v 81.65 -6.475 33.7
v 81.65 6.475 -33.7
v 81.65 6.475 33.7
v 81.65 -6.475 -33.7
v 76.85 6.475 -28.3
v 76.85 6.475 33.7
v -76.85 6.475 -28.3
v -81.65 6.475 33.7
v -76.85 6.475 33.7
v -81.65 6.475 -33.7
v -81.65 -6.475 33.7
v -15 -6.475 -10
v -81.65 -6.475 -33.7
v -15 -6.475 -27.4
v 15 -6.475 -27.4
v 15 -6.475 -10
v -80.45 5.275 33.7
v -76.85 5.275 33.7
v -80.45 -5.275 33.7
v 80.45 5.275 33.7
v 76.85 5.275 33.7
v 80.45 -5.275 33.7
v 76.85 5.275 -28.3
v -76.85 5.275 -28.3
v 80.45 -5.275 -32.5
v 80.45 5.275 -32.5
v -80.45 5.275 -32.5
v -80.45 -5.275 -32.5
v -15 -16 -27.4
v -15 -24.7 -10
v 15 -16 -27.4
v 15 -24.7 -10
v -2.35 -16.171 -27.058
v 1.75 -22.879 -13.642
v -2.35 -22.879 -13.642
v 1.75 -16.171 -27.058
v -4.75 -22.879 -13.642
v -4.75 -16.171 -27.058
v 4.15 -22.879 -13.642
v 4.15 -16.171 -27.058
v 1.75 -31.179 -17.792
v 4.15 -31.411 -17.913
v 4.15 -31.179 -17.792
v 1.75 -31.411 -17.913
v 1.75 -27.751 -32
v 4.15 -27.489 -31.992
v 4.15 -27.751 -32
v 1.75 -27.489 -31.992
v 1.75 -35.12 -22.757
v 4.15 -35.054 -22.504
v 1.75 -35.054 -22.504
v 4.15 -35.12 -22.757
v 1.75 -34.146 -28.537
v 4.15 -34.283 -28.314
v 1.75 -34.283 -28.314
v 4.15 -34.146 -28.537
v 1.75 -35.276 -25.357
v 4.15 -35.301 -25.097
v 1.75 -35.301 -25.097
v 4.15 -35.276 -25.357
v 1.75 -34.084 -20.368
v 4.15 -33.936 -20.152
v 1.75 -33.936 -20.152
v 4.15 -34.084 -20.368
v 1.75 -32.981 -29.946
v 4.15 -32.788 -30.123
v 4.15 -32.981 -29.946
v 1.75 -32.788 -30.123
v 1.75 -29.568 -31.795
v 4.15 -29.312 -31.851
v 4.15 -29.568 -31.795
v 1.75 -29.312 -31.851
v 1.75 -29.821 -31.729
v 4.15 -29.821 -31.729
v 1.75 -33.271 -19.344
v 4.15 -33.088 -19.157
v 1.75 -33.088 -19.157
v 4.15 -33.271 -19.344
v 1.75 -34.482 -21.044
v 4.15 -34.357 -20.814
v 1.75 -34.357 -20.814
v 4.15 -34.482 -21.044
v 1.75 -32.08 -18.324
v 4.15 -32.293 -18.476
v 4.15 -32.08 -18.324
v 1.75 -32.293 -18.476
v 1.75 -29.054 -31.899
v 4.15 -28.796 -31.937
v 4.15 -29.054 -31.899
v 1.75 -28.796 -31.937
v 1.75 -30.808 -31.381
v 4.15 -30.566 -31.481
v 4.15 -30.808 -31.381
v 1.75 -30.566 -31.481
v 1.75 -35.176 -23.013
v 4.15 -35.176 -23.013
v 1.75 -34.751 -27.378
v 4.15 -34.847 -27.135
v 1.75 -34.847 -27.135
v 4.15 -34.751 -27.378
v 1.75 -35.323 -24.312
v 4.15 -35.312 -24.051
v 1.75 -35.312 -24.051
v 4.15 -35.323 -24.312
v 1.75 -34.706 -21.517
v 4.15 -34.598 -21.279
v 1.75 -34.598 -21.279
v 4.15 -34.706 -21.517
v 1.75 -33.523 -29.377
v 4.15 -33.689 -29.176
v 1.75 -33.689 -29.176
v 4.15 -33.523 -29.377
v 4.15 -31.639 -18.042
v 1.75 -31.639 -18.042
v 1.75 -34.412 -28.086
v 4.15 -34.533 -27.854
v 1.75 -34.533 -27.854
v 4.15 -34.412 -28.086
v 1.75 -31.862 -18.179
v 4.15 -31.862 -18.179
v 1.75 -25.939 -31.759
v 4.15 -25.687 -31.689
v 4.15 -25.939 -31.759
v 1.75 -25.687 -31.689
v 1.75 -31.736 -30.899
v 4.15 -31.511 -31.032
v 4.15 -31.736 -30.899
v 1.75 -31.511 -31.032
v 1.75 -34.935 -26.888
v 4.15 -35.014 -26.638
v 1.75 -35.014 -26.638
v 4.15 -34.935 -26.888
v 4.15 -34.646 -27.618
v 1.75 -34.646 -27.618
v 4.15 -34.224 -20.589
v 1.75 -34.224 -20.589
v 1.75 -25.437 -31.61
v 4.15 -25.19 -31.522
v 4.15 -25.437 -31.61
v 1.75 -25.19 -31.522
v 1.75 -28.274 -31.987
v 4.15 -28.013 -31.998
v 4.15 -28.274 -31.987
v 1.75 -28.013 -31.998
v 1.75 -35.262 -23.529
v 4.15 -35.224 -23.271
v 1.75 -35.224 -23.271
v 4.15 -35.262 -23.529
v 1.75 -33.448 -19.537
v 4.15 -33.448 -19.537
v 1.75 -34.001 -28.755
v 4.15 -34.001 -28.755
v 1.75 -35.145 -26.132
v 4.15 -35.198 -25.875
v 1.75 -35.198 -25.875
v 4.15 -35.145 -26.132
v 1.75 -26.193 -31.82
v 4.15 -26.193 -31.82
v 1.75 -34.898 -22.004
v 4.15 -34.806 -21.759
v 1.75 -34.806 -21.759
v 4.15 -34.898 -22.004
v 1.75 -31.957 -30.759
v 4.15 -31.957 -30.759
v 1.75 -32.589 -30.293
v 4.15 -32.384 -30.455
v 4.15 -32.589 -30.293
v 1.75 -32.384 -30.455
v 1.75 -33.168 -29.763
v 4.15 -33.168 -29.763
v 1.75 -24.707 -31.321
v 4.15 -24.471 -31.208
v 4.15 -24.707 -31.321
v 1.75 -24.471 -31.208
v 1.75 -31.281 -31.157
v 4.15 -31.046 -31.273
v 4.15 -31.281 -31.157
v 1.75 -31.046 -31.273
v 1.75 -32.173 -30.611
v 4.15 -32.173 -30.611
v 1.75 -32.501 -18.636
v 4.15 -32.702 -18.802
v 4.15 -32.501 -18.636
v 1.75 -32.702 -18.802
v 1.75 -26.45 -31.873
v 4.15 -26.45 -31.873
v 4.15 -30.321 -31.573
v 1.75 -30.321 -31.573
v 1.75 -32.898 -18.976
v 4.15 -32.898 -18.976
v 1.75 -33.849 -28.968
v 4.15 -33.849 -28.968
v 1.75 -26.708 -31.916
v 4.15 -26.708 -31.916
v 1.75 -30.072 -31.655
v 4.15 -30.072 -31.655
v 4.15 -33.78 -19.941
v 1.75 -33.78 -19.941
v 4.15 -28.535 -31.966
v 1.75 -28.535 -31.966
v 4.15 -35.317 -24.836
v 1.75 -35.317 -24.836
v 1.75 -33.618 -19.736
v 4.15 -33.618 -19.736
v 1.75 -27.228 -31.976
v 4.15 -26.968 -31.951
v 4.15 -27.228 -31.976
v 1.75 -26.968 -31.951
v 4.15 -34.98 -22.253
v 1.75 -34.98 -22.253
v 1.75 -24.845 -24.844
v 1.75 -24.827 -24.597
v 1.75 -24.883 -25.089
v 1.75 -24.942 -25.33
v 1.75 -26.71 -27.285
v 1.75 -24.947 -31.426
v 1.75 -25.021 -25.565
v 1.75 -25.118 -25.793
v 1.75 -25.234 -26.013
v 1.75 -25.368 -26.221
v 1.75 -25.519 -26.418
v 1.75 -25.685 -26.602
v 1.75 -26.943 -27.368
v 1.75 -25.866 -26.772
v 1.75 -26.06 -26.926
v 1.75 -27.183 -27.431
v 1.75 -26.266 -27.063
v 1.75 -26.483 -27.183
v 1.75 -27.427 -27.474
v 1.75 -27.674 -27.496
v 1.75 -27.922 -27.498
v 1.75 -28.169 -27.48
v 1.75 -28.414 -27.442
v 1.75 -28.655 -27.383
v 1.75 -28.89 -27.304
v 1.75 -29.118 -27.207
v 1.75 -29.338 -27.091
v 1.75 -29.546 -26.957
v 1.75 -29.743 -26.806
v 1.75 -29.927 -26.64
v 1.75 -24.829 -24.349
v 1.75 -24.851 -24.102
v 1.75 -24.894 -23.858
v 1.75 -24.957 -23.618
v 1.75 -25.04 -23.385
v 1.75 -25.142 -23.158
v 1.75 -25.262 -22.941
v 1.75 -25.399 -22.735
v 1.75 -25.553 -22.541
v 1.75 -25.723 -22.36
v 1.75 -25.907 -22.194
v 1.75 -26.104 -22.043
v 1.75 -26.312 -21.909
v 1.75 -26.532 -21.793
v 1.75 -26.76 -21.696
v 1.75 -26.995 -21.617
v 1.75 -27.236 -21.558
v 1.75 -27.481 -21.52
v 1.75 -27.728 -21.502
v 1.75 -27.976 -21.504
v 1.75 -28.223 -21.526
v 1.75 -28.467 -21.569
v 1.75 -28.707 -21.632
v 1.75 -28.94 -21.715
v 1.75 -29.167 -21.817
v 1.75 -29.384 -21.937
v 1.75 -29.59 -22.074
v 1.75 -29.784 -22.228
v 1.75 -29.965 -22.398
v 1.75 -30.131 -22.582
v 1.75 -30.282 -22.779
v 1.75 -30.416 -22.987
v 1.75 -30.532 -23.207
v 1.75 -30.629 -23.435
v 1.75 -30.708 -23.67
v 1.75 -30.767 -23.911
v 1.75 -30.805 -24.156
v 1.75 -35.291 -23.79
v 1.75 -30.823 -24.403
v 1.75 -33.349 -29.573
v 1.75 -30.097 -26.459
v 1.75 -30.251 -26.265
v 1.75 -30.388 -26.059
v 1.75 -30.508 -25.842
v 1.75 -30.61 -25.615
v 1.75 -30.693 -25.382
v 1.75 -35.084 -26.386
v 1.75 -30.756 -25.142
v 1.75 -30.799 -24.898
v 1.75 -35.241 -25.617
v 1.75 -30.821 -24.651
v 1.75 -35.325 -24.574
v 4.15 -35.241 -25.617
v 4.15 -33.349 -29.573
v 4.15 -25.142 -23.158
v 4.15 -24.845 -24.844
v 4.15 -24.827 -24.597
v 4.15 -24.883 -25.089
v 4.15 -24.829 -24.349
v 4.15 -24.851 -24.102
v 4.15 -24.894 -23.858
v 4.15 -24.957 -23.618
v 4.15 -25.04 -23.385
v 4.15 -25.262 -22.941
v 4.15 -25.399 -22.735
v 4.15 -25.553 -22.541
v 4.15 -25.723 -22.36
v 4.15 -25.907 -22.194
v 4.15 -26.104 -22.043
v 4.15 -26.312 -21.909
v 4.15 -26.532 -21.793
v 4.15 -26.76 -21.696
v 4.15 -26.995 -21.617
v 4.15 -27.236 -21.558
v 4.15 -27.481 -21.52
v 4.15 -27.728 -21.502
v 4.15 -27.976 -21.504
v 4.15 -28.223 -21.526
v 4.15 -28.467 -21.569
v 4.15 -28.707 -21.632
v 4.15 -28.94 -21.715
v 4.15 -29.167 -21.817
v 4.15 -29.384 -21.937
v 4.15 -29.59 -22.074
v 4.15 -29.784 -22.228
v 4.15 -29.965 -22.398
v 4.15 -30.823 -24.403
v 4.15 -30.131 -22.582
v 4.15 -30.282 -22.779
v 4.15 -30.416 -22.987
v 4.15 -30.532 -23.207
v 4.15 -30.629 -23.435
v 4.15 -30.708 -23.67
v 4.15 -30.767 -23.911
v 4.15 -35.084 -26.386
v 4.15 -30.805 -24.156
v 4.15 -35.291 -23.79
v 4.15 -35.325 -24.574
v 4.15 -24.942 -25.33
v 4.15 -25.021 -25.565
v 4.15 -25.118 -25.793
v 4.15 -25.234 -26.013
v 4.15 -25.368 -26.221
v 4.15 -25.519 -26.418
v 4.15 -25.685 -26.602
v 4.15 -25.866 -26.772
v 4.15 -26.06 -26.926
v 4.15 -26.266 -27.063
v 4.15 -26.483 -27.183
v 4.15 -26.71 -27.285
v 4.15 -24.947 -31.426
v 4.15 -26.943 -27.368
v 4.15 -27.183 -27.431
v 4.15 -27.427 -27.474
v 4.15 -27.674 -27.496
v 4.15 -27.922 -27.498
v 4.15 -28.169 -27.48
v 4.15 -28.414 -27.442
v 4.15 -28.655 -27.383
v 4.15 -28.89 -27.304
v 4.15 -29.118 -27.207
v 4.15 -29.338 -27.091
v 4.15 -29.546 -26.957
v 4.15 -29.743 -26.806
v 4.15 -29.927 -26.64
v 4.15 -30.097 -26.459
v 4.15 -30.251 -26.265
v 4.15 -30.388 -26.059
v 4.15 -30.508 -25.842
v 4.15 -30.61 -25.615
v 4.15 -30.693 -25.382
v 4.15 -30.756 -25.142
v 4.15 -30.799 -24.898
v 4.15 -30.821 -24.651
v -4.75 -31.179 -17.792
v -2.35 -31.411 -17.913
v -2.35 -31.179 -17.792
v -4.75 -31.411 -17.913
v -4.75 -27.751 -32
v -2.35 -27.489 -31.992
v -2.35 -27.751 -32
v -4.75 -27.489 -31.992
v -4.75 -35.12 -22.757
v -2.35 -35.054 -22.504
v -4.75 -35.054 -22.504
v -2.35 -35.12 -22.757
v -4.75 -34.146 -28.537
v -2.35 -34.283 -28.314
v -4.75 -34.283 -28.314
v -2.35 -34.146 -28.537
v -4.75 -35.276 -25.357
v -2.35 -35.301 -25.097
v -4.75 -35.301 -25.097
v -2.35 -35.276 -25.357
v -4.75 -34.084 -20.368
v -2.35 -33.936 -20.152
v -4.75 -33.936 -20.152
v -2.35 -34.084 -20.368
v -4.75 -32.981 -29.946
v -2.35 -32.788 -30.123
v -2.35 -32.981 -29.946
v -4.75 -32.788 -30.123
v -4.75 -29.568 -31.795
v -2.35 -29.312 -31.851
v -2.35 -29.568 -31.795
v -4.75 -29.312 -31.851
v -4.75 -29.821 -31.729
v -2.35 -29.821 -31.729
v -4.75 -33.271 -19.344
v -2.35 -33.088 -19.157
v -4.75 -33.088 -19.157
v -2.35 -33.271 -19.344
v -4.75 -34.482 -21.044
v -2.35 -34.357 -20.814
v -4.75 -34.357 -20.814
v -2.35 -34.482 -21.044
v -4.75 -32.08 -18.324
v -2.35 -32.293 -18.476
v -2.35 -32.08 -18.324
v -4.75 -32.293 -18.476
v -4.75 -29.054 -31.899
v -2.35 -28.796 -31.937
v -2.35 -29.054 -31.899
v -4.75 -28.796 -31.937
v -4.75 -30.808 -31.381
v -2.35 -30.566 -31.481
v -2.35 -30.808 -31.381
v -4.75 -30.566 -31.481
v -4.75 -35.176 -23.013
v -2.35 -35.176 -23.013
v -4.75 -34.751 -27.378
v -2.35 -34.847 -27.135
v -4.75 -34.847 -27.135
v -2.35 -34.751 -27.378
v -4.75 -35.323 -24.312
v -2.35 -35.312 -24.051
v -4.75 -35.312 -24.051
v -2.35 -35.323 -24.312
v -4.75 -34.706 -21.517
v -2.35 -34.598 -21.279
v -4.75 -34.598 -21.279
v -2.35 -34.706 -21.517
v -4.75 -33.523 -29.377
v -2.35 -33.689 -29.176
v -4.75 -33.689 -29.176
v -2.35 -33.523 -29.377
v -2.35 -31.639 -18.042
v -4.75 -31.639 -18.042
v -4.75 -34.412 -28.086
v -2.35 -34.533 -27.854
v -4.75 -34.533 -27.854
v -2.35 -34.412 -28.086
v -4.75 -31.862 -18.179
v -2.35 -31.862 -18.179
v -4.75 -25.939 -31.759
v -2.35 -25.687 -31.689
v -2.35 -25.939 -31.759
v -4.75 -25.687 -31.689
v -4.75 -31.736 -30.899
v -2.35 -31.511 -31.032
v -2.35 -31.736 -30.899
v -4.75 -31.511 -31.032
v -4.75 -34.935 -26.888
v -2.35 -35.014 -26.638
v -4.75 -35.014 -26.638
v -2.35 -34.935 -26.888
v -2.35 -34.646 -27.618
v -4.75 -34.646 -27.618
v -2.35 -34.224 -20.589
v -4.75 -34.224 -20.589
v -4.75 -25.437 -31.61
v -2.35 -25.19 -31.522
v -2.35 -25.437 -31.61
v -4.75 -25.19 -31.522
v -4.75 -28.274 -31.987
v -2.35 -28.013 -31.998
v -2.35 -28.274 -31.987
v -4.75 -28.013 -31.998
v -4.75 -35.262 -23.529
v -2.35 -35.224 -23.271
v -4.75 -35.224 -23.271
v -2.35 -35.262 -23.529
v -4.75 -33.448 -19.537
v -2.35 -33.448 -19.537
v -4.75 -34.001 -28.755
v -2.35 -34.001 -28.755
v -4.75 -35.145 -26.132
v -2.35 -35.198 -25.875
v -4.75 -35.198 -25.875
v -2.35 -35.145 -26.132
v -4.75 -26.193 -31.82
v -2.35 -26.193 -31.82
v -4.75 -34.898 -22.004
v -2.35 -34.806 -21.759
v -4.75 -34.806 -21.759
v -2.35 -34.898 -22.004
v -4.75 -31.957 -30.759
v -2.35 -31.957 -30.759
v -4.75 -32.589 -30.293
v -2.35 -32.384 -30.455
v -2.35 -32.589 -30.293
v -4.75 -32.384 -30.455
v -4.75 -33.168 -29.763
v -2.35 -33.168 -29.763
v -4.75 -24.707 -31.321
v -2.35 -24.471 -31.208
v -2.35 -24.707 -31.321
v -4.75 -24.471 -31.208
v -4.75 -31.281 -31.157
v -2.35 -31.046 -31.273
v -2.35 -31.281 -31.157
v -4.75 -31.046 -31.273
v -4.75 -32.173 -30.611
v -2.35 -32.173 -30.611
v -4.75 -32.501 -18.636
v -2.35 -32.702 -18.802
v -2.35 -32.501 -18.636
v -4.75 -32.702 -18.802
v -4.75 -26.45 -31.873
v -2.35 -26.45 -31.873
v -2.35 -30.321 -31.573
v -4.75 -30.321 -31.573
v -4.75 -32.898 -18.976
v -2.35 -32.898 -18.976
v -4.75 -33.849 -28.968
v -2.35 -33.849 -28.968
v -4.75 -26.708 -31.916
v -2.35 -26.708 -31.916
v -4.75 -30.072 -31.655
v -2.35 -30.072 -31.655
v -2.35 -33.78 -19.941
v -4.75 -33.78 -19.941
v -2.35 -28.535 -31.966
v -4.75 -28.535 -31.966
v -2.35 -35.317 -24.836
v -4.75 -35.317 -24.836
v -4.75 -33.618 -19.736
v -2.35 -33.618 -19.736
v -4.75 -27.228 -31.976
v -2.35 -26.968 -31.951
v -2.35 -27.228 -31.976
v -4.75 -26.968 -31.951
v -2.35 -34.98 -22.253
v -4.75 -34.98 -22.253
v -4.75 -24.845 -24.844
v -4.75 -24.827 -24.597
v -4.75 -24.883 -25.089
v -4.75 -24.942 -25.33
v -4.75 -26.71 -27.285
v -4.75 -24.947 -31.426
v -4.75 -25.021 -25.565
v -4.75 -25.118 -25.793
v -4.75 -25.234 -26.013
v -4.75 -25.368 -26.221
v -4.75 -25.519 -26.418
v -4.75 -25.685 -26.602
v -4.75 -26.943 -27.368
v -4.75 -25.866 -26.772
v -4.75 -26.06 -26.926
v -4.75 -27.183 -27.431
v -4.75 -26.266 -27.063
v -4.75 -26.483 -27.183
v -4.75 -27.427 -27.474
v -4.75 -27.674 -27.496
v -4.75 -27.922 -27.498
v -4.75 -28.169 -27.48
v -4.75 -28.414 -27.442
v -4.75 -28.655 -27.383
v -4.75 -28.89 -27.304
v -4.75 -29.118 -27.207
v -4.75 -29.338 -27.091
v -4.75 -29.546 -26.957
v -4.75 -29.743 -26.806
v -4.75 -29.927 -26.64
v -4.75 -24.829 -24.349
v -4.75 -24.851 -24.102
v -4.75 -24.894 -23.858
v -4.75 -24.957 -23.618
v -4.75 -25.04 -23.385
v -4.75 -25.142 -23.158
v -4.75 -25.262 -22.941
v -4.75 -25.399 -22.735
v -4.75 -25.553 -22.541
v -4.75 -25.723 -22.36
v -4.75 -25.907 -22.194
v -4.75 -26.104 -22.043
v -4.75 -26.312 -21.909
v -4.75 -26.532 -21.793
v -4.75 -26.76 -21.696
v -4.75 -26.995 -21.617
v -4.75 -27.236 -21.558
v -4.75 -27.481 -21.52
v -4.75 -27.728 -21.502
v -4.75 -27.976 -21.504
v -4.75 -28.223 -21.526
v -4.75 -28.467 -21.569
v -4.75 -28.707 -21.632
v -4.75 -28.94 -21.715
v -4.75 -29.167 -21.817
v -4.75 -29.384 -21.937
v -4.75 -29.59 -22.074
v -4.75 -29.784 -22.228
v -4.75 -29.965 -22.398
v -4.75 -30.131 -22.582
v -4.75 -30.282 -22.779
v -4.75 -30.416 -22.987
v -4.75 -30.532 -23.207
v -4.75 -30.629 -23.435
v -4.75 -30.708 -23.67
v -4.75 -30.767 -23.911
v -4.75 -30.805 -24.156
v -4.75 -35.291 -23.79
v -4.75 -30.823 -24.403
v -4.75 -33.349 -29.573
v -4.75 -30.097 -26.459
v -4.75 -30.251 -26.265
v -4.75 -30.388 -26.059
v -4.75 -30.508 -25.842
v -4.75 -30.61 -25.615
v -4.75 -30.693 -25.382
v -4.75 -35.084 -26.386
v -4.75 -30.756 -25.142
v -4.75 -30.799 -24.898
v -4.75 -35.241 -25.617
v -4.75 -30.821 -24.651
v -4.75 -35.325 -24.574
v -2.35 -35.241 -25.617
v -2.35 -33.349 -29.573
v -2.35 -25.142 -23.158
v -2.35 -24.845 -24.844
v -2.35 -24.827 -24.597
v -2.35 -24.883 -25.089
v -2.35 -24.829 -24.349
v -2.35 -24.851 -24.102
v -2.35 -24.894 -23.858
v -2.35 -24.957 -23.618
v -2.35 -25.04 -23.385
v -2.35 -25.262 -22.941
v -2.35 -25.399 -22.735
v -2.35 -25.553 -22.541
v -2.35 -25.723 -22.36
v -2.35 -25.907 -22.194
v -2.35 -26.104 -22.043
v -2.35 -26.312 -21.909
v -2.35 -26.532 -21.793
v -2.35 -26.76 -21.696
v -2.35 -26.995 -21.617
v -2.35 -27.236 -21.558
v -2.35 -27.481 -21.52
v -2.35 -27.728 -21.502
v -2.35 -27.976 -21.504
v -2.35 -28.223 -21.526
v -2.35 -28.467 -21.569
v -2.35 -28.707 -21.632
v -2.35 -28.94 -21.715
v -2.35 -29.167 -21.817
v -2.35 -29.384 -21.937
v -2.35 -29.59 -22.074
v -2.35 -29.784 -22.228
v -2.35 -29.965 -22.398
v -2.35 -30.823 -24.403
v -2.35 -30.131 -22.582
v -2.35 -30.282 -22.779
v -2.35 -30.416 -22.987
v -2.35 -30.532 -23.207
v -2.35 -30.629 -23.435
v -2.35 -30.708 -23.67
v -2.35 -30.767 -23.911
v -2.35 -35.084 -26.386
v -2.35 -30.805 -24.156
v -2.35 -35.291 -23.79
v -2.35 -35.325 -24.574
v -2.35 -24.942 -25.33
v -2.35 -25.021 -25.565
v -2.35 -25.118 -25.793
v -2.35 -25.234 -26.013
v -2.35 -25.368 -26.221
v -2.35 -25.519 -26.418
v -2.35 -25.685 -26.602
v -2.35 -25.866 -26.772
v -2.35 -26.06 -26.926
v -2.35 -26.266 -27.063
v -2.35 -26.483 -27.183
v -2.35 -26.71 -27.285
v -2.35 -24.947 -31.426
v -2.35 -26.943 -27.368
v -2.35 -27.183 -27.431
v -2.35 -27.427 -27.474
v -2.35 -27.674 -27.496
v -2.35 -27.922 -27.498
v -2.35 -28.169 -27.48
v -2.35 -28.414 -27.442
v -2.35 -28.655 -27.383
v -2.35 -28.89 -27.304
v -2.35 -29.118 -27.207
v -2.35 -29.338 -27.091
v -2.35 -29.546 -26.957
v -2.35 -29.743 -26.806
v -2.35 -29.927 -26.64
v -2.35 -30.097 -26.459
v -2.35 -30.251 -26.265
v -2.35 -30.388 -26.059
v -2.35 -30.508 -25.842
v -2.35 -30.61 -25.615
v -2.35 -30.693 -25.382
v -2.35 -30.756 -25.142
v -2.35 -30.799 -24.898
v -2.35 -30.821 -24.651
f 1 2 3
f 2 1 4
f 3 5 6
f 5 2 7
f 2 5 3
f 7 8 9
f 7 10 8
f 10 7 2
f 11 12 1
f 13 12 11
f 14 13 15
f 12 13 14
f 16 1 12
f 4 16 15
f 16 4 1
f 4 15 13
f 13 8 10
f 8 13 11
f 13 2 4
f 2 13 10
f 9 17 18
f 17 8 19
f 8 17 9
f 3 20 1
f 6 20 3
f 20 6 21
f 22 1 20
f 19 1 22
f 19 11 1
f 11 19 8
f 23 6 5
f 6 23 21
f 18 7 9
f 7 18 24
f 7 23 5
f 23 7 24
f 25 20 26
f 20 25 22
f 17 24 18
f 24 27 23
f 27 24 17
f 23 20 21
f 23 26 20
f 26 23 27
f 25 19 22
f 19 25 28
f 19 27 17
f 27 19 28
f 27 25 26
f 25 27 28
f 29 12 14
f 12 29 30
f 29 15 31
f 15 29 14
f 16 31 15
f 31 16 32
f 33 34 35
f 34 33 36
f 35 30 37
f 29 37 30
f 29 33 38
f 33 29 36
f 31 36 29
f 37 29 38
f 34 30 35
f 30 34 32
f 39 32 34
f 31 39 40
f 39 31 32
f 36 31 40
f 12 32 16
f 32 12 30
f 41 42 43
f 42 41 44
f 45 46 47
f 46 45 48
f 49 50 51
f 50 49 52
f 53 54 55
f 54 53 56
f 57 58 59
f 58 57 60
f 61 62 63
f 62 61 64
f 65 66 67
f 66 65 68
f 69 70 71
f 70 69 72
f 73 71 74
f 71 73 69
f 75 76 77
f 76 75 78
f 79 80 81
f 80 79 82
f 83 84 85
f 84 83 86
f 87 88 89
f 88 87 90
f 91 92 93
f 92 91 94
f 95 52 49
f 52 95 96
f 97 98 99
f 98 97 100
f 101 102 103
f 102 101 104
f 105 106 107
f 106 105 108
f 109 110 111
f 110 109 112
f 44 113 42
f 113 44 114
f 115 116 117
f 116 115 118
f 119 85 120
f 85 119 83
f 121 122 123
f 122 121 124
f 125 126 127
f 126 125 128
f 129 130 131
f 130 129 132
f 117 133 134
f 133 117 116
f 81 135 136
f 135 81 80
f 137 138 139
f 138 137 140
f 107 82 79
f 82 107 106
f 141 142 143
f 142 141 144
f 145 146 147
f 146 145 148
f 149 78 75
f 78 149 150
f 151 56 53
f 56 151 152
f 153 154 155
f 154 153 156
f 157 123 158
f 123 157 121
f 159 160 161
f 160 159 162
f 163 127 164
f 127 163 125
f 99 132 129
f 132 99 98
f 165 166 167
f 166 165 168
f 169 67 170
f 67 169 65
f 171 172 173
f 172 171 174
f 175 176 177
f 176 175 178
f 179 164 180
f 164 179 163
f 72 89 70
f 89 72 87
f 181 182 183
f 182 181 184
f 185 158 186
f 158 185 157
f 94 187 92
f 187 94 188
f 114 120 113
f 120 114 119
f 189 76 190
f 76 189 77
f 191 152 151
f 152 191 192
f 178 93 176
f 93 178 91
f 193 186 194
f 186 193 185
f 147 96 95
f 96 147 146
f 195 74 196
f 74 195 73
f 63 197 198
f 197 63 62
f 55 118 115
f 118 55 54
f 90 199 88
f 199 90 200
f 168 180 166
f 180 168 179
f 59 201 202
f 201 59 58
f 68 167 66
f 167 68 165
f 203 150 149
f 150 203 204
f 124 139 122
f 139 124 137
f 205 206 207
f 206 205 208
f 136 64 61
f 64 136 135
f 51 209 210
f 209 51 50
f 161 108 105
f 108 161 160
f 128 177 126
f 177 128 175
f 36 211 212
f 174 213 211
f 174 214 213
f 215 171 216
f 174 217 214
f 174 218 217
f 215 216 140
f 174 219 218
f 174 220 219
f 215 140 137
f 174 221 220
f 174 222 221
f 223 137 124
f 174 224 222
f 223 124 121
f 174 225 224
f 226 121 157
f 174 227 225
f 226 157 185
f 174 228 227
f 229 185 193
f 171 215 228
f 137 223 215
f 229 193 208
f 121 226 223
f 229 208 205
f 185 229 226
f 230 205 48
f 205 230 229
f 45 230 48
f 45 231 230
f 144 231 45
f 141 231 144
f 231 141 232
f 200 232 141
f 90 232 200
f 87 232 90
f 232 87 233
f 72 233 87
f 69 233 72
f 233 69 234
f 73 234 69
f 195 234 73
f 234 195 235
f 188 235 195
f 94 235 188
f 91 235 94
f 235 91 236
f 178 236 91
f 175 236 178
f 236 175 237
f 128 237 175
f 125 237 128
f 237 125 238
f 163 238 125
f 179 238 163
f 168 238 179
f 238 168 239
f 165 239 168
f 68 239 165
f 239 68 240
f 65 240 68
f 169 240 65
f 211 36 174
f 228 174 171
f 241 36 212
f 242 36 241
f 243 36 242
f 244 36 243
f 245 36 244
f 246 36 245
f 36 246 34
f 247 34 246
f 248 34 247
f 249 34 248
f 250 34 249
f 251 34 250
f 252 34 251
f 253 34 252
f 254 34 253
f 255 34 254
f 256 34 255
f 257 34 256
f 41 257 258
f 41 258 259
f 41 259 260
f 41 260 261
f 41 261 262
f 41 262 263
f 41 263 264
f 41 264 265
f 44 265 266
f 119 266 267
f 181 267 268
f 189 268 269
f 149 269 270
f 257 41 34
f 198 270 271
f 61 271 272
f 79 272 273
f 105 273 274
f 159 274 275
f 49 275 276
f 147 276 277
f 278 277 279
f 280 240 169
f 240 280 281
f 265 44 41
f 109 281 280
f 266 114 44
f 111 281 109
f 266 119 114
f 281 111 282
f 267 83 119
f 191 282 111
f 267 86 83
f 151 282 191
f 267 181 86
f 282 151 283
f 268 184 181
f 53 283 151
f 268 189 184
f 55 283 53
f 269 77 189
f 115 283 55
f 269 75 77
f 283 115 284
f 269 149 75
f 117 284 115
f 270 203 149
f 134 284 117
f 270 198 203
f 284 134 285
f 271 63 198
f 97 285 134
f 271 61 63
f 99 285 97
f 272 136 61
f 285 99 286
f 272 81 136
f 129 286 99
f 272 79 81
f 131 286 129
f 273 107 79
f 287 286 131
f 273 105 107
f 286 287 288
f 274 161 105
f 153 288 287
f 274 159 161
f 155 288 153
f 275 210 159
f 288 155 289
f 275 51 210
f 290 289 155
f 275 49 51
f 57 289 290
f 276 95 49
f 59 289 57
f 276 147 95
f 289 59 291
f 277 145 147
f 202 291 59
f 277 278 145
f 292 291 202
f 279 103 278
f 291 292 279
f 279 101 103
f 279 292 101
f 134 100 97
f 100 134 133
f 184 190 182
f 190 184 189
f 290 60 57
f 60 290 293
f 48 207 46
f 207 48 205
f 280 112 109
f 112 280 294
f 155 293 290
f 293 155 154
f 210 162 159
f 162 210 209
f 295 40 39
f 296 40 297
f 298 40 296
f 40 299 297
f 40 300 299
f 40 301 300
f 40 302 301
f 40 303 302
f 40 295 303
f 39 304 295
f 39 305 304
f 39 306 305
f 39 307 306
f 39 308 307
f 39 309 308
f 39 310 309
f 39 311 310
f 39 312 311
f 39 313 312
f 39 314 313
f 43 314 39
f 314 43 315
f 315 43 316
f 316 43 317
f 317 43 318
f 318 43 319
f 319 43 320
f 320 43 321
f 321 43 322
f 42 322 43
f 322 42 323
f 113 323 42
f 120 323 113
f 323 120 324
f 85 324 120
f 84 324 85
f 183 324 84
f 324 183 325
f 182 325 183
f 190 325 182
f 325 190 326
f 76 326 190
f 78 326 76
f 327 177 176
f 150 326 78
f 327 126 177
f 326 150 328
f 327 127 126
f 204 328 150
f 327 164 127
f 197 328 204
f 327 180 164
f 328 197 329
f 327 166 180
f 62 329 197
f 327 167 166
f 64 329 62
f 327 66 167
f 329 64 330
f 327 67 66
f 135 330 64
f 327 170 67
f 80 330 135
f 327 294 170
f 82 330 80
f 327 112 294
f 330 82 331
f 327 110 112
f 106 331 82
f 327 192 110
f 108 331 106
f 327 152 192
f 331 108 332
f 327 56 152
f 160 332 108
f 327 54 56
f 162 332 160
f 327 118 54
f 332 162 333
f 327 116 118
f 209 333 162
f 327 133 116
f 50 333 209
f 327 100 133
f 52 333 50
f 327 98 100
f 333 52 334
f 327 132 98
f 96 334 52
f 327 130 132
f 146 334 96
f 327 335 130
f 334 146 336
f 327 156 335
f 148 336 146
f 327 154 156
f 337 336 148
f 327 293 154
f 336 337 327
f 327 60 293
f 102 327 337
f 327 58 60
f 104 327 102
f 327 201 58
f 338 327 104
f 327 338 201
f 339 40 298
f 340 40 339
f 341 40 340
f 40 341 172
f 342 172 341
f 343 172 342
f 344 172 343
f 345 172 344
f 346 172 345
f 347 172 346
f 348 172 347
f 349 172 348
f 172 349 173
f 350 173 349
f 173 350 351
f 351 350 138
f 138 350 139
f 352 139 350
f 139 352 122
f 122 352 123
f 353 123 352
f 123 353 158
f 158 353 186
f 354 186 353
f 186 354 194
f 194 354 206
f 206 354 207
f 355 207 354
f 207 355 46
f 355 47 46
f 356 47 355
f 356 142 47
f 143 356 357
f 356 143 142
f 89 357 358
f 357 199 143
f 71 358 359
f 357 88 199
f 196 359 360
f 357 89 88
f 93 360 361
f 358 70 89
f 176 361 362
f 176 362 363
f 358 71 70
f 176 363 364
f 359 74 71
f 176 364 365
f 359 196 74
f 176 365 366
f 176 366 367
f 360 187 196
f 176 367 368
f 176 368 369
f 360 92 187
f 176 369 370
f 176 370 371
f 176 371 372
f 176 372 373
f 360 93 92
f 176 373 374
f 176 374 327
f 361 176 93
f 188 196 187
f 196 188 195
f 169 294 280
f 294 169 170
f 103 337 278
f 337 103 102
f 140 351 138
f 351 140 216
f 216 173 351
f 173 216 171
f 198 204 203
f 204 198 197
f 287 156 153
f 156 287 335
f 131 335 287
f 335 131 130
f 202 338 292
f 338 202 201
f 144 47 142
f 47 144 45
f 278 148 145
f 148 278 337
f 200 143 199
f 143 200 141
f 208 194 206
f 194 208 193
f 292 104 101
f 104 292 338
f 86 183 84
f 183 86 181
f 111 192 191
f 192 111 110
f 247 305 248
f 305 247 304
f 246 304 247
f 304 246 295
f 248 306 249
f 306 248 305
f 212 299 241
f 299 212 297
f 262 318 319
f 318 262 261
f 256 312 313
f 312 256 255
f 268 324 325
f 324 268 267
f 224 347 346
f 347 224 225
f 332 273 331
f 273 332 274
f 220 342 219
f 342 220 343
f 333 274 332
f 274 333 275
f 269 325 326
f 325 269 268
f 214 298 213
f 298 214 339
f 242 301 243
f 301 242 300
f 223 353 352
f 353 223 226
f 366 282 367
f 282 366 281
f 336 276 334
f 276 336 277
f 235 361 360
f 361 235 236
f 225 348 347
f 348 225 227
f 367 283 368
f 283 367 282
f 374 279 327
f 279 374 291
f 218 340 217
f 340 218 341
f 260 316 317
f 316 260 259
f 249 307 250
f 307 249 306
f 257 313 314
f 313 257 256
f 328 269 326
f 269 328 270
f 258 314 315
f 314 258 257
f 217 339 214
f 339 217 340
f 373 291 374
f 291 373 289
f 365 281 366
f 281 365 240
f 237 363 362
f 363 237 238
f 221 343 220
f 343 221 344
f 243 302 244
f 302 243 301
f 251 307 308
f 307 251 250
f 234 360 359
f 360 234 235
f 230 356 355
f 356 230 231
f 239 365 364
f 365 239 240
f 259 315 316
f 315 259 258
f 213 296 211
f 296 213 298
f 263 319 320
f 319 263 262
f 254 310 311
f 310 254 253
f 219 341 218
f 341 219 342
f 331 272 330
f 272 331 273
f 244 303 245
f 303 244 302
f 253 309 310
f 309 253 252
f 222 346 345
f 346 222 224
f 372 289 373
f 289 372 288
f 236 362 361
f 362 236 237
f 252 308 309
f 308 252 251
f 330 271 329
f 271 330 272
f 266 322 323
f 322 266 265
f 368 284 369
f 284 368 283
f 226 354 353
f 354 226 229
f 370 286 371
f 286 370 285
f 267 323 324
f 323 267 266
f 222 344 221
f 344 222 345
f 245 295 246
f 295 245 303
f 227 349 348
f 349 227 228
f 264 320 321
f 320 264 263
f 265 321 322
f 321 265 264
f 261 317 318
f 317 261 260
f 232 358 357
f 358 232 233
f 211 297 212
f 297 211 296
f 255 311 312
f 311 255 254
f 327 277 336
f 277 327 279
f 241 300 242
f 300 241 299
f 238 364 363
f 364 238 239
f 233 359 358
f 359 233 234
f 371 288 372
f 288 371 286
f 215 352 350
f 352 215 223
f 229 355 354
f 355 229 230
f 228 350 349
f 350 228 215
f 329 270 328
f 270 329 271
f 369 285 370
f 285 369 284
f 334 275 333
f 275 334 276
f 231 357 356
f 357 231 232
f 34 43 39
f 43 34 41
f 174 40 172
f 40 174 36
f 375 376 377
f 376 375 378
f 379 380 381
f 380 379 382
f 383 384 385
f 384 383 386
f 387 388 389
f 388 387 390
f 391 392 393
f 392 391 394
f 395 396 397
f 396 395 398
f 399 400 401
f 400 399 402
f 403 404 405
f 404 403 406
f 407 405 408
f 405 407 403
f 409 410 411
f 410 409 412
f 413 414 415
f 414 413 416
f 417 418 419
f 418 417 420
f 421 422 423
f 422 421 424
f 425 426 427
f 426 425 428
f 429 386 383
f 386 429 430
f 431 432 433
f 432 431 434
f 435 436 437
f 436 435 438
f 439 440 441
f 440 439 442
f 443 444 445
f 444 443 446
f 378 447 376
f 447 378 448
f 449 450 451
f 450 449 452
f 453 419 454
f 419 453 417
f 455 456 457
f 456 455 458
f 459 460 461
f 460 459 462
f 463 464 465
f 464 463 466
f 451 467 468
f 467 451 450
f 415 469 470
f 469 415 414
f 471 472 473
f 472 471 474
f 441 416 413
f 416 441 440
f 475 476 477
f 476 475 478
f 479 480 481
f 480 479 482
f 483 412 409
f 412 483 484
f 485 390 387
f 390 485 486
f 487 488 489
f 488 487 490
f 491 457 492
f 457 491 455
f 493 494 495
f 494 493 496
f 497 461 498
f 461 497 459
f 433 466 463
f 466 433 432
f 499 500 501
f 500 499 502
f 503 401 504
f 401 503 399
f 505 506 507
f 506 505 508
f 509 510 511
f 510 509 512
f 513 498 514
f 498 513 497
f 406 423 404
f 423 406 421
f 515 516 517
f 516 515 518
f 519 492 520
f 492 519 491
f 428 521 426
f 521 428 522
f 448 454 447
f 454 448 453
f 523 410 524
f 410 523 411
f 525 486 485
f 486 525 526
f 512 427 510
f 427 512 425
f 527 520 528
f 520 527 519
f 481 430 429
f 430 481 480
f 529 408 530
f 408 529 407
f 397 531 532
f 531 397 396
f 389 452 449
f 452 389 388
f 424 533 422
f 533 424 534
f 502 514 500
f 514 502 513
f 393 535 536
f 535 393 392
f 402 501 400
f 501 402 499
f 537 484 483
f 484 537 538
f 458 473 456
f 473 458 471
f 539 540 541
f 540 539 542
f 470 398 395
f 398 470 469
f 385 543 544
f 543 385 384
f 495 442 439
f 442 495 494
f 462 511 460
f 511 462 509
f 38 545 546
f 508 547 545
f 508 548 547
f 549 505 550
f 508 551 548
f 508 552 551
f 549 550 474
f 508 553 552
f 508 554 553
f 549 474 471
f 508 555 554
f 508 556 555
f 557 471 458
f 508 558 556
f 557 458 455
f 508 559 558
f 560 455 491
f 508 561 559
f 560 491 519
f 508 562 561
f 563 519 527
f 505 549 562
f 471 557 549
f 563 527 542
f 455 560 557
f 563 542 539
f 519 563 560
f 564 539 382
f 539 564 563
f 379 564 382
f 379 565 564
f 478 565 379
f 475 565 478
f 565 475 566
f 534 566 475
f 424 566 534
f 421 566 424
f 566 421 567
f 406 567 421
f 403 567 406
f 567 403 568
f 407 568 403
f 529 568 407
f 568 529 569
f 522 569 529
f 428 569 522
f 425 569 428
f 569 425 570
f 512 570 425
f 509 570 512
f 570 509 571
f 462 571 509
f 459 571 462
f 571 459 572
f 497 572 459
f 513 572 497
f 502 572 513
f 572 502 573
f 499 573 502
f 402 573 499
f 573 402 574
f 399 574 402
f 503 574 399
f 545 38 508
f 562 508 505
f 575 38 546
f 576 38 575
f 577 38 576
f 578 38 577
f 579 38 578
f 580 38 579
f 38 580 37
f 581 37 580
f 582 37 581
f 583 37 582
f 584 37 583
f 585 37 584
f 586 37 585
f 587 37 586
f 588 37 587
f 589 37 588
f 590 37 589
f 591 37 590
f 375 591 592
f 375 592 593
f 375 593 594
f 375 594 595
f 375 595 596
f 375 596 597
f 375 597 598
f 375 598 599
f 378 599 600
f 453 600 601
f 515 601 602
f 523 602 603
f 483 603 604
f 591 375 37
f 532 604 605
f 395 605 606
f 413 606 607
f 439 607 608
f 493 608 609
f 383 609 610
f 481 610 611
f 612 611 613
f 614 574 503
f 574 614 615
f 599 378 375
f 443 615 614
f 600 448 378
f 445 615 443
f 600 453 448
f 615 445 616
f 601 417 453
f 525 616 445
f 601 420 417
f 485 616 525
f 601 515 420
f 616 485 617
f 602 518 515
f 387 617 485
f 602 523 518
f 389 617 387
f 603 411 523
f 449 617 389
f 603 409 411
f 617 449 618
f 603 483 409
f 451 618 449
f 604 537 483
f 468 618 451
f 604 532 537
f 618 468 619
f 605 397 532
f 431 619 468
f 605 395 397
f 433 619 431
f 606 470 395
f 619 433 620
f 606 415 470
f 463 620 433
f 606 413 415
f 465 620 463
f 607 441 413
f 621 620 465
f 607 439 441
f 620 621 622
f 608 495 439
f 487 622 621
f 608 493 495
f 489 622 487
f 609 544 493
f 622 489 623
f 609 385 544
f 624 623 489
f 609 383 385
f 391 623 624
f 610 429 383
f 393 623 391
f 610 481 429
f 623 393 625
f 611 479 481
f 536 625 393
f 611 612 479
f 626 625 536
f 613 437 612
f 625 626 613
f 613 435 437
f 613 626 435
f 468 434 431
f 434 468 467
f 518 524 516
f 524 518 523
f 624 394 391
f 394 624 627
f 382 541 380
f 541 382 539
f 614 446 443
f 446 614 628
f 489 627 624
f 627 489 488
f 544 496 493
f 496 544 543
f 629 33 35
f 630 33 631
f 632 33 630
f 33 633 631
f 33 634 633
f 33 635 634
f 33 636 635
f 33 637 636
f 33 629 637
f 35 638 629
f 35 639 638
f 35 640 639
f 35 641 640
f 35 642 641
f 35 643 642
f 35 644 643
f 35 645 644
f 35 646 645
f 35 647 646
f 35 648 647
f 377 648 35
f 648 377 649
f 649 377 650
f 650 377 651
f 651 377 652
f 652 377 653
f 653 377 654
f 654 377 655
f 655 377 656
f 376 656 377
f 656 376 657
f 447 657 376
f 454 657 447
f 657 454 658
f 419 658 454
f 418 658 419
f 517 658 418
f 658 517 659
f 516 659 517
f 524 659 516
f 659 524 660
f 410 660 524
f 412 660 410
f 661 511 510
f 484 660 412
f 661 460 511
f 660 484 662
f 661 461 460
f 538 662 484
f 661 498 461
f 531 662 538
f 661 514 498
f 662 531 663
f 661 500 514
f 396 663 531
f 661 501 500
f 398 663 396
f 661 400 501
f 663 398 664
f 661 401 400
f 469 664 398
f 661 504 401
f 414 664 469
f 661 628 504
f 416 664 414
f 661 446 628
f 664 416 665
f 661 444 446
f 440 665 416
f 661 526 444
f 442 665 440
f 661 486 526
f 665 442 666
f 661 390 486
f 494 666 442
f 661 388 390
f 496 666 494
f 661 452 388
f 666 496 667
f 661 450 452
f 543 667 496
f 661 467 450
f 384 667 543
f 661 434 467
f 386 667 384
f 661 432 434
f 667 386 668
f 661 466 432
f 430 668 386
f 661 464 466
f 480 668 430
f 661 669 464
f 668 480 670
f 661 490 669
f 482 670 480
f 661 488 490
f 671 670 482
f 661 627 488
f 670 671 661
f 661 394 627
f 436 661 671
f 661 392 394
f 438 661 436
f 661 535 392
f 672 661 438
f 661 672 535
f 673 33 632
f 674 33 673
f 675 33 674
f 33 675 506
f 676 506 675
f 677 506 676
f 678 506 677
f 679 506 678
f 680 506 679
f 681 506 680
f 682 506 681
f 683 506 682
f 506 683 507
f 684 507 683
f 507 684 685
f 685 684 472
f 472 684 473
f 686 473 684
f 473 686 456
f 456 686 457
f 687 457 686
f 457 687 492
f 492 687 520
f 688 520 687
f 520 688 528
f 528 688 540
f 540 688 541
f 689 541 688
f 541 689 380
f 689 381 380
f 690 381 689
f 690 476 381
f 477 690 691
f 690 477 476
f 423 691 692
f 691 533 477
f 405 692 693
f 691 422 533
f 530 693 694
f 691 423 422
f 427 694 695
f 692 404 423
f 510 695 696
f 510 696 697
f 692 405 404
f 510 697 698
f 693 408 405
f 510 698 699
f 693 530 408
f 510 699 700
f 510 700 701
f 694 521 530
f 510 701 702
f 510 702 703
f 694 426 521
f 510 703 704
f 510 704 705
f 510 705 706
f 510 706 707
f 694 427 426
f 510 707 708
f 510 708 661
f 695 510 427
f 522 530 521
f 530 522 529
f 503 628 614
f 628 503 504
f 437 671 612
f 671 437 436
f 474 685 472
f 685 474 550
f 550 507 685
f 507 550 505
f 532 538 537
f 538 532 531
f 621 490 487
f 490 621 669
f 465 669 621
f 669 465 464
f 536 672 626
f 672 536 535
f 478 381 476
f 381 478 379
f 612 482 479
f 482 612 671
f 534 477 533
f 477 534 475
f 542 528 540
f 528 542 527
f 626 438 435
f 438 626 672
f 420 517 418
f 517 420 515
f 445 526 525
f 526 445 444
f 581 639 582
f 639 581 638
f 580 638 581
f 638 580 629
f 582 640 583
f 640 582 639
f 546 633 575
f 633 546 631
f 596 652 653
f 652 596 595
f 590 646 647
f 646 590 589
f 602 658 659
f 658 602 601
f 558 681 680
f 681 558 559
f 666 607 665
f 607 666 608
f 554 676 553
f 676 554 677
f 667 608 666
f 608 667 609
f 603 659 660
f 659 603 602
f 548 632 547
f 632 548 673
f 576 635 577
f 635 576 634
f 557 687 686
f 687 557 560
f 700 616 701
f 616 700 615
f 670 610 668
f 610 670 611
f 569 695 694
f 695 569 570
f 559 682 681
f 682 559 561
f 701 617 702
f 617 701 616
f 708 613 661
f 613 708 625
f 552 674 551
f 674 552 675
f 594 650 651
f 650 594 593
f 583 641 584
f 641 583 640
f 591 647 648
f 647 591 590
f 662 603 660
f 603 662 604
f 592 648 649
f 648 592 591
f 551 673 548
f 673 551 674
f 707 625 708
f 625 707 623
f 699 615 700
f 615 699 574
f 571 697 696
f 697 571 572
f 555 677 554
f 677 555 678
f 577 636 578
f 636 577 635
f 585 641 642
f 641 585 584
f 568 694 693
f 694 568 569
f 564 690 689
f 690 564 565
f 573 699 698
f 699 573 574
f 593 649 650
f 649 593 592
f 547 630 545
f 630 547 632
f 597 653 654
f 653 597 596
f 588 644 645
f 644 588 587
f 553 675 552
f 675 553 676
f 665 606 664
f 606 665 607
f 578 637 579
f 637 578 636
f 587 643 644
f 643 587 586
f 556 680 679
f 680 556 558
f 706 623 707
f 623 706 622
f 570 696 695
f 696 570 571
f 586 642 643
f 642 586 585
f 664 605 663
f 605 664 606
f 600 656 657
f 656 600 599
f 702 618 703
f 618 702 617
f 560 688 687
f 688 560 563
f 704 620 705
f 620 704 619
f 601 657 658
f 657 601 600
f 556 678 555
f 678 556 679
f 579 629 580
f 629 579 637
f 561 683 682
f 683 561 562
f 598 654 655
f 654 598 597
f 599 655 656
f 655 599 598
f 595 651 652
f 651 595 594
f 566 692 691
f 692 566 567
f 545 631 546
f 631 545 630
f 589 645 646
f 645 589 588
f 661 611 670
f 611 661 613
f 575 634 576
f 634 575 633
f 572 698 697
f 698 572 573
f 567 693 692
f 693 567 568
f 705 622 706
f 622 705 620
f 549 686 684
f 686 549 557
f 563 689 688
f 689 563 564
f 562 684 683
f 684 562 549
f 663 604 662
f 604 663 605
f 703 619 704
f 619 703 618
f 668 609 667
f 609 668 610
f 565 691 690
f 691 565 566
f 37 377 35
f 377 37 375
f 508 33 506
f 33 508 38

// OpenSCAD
// file: ../wiki-yoinks/prism.scad
module prism(l, w, h) {
    // from wiki
    // https://en.wikibooks.org/wiki/OpenSCAD_User_Manual/Primitive_Solids#polyhedron
    polyhedron(points =
                   [
                       [ 0, 0, 0 ], [ l, 0, 0 ], [ l, w, 0 ], [ 0, w, 0 ],
                       [ 0, w, h ], [ l, w, h ]
                   ],
               faces = [
                   [ 0, 1, 2, 3 ], [ 5, 4, 3, 2 ], [ 0, 4, 5, 1 ], [ 0, 3, 4 ],
                   [ 5, 2, 1 ]
               ]);
}
// file: GoPro_Mount.scad
// slightly modified version of https://www.thingiverse.com/thing:3088912/files

// Associated BSD License
// Copyright 2022 Julietta
// Redistribution and use in source and binary forms, with or without modification, are permitted provided that the following conditions are met:
// 1. Redistributions of source code must retain the above copyright notice, this list of conditions and the following disclaimer.
// 2. Redistributions in binary form must reproduce the above copyright notice, this list of conditions and the following disclaimer in the documentation and/or other materials provided with the distribution.
// THIS SOFTWARE IS PROVIDED BY THE COPYRIGHT HOLDERS AND CONTRIBUTORS "AS IS" AND ANY EXPRESS OR IMPLIED WARRANTIES, INCLUDING, BUT NOT LIMITED TO, THE IMPLIED WARRANTIES OF MERCHANTABILITY AND FITNESS FOR A PARTICULAR PURPOSE ARE DISCLAIMED. IN NO EVENT SHALL THE COPYRIGHT HOLDER OR CONTRIBUTORS BE LIABLE FOR ANY DIRECT, INDIRECT, INCIDENTAL, SPECIAL, EXEMPLARY, OR CONSEQUENTIAL DAMAGES (INCLUDING, BUT NOT LIMITED TO, PROCUREMENT OF SUBSTITUTE GOODS OR SERVICES; LOSS OF USE, DATA, OR PROFITS; OR BUSINESS INTERRUPTION) HOWEVER CAUSED AND ON ANY THEORY OF LIABILITY, WHETHER IN CONTRACT, STRICT LIABILITY, OR TORT (INCLUDING NEGLIGENCE OR OTHERWISE) ARISING IN ANY WAY OUT OF THE USE OF THIS SOFTWARE, EVEN IF ADVISED OF THE POSSIBILITY OF SUCH DAMAGE.


$fa = 2;
$fs = 0.25;
Extra_Mount_Depth = 3;

module flap(Width) {
    rotate([ 90, 0, 0 ]) {
        translate([ 3.5, (-7.5), 0 ]) cube([ 4 + Extra_Mount_Depth, 15, Width ]);

        translate([ 0, (-7.5), 0 ]) cube([ 7.5 + Extra_Mount_Depth, 4, Width ]);

        translate([ 0, 3.5, 0 ]) cube([ 7.5 + Extra_Mount_Depth, 4, Width ]);

        difference() {
            cylinder(h = Width, d = 15);

            translate([ 0, 0, (-1) ]) cylinder(h = Width + 2, d = 6);
        }
    }
}

module mount2(flapWidth = 2.4) {
    translate([ 0, 4, 0 ]) flap(flapWidth);
    translate([ 0, 10.5, 0 ]) flap(flapWidth);
}
// main file
use <GoPro_Mount.scad>
use <../wiki-yoinks/prism.scad>

phoneCaseThickness = 10.55;
usableHeight = 65;
phoneLength = 160.9;
phoneWidth = 130;

holderThickness = 2.4;
flapWidth = 2.4;

module Phone() {
    color([ 75 / 255, 0 / 255, 0 / 255 ]) {
        cube(size = [ phoneLength, phoneWidth, phoneCaseThickness ], center = true);
    }
}

module Holder() {
    dim = [ phoneLength + holderThickness, usableHeight + holderThickness, phoneCaseThickness + holderThickness ];
    color([ 75 / 255, 75 / 255, 75 / 255 ]) {
        difference() {
            cube(dim, center = true);

            translate([ 0, -holderThickness - 3, phoneCaseThickness / 2 ]) {
                cube(size = [ phoneLength - holderThickness * 3, usableHeight + holderThickness, phoneCaseThickness ],
                     center = true);
            }
            translate([ 0, -usableHeight / 2, 0 ]) {
                Phone();
            }
        }
    }

    l = 30;
    h=15;
    translate([0,-5,0]){
    difference(){
    rotate([270,180,00])
    translate([-l/2, -31, holderThickness]) {
        translate([0, h, 0]) {
        cube(size=[l, l/3, l]);
        }
        prism(l,h,30);
        
    }
    translate([-50,0,-50])
    cube([100,15,100]);
    }
    translate([ 5.75, 5+usableHeight / 2 - 8, -12-phoneCaseThickness * 1.5 ]) {
        rotate([ 0, -116.565, 90 ]) mount2(flapWidth);
    }
    }
}

rotate([ -90, 0, 0 ]) {

    Holder();
    
}
    // translate([-6,17,-phoneCaseThickness*0.7])
    // cube(size=[12, 15, 3]);
    // translate([ 5.75, usableHeight/2-8, -phoneCaseThickness * 1.5 ]){
    //     rotate([ 0, -90, 90 ]) mount2();
